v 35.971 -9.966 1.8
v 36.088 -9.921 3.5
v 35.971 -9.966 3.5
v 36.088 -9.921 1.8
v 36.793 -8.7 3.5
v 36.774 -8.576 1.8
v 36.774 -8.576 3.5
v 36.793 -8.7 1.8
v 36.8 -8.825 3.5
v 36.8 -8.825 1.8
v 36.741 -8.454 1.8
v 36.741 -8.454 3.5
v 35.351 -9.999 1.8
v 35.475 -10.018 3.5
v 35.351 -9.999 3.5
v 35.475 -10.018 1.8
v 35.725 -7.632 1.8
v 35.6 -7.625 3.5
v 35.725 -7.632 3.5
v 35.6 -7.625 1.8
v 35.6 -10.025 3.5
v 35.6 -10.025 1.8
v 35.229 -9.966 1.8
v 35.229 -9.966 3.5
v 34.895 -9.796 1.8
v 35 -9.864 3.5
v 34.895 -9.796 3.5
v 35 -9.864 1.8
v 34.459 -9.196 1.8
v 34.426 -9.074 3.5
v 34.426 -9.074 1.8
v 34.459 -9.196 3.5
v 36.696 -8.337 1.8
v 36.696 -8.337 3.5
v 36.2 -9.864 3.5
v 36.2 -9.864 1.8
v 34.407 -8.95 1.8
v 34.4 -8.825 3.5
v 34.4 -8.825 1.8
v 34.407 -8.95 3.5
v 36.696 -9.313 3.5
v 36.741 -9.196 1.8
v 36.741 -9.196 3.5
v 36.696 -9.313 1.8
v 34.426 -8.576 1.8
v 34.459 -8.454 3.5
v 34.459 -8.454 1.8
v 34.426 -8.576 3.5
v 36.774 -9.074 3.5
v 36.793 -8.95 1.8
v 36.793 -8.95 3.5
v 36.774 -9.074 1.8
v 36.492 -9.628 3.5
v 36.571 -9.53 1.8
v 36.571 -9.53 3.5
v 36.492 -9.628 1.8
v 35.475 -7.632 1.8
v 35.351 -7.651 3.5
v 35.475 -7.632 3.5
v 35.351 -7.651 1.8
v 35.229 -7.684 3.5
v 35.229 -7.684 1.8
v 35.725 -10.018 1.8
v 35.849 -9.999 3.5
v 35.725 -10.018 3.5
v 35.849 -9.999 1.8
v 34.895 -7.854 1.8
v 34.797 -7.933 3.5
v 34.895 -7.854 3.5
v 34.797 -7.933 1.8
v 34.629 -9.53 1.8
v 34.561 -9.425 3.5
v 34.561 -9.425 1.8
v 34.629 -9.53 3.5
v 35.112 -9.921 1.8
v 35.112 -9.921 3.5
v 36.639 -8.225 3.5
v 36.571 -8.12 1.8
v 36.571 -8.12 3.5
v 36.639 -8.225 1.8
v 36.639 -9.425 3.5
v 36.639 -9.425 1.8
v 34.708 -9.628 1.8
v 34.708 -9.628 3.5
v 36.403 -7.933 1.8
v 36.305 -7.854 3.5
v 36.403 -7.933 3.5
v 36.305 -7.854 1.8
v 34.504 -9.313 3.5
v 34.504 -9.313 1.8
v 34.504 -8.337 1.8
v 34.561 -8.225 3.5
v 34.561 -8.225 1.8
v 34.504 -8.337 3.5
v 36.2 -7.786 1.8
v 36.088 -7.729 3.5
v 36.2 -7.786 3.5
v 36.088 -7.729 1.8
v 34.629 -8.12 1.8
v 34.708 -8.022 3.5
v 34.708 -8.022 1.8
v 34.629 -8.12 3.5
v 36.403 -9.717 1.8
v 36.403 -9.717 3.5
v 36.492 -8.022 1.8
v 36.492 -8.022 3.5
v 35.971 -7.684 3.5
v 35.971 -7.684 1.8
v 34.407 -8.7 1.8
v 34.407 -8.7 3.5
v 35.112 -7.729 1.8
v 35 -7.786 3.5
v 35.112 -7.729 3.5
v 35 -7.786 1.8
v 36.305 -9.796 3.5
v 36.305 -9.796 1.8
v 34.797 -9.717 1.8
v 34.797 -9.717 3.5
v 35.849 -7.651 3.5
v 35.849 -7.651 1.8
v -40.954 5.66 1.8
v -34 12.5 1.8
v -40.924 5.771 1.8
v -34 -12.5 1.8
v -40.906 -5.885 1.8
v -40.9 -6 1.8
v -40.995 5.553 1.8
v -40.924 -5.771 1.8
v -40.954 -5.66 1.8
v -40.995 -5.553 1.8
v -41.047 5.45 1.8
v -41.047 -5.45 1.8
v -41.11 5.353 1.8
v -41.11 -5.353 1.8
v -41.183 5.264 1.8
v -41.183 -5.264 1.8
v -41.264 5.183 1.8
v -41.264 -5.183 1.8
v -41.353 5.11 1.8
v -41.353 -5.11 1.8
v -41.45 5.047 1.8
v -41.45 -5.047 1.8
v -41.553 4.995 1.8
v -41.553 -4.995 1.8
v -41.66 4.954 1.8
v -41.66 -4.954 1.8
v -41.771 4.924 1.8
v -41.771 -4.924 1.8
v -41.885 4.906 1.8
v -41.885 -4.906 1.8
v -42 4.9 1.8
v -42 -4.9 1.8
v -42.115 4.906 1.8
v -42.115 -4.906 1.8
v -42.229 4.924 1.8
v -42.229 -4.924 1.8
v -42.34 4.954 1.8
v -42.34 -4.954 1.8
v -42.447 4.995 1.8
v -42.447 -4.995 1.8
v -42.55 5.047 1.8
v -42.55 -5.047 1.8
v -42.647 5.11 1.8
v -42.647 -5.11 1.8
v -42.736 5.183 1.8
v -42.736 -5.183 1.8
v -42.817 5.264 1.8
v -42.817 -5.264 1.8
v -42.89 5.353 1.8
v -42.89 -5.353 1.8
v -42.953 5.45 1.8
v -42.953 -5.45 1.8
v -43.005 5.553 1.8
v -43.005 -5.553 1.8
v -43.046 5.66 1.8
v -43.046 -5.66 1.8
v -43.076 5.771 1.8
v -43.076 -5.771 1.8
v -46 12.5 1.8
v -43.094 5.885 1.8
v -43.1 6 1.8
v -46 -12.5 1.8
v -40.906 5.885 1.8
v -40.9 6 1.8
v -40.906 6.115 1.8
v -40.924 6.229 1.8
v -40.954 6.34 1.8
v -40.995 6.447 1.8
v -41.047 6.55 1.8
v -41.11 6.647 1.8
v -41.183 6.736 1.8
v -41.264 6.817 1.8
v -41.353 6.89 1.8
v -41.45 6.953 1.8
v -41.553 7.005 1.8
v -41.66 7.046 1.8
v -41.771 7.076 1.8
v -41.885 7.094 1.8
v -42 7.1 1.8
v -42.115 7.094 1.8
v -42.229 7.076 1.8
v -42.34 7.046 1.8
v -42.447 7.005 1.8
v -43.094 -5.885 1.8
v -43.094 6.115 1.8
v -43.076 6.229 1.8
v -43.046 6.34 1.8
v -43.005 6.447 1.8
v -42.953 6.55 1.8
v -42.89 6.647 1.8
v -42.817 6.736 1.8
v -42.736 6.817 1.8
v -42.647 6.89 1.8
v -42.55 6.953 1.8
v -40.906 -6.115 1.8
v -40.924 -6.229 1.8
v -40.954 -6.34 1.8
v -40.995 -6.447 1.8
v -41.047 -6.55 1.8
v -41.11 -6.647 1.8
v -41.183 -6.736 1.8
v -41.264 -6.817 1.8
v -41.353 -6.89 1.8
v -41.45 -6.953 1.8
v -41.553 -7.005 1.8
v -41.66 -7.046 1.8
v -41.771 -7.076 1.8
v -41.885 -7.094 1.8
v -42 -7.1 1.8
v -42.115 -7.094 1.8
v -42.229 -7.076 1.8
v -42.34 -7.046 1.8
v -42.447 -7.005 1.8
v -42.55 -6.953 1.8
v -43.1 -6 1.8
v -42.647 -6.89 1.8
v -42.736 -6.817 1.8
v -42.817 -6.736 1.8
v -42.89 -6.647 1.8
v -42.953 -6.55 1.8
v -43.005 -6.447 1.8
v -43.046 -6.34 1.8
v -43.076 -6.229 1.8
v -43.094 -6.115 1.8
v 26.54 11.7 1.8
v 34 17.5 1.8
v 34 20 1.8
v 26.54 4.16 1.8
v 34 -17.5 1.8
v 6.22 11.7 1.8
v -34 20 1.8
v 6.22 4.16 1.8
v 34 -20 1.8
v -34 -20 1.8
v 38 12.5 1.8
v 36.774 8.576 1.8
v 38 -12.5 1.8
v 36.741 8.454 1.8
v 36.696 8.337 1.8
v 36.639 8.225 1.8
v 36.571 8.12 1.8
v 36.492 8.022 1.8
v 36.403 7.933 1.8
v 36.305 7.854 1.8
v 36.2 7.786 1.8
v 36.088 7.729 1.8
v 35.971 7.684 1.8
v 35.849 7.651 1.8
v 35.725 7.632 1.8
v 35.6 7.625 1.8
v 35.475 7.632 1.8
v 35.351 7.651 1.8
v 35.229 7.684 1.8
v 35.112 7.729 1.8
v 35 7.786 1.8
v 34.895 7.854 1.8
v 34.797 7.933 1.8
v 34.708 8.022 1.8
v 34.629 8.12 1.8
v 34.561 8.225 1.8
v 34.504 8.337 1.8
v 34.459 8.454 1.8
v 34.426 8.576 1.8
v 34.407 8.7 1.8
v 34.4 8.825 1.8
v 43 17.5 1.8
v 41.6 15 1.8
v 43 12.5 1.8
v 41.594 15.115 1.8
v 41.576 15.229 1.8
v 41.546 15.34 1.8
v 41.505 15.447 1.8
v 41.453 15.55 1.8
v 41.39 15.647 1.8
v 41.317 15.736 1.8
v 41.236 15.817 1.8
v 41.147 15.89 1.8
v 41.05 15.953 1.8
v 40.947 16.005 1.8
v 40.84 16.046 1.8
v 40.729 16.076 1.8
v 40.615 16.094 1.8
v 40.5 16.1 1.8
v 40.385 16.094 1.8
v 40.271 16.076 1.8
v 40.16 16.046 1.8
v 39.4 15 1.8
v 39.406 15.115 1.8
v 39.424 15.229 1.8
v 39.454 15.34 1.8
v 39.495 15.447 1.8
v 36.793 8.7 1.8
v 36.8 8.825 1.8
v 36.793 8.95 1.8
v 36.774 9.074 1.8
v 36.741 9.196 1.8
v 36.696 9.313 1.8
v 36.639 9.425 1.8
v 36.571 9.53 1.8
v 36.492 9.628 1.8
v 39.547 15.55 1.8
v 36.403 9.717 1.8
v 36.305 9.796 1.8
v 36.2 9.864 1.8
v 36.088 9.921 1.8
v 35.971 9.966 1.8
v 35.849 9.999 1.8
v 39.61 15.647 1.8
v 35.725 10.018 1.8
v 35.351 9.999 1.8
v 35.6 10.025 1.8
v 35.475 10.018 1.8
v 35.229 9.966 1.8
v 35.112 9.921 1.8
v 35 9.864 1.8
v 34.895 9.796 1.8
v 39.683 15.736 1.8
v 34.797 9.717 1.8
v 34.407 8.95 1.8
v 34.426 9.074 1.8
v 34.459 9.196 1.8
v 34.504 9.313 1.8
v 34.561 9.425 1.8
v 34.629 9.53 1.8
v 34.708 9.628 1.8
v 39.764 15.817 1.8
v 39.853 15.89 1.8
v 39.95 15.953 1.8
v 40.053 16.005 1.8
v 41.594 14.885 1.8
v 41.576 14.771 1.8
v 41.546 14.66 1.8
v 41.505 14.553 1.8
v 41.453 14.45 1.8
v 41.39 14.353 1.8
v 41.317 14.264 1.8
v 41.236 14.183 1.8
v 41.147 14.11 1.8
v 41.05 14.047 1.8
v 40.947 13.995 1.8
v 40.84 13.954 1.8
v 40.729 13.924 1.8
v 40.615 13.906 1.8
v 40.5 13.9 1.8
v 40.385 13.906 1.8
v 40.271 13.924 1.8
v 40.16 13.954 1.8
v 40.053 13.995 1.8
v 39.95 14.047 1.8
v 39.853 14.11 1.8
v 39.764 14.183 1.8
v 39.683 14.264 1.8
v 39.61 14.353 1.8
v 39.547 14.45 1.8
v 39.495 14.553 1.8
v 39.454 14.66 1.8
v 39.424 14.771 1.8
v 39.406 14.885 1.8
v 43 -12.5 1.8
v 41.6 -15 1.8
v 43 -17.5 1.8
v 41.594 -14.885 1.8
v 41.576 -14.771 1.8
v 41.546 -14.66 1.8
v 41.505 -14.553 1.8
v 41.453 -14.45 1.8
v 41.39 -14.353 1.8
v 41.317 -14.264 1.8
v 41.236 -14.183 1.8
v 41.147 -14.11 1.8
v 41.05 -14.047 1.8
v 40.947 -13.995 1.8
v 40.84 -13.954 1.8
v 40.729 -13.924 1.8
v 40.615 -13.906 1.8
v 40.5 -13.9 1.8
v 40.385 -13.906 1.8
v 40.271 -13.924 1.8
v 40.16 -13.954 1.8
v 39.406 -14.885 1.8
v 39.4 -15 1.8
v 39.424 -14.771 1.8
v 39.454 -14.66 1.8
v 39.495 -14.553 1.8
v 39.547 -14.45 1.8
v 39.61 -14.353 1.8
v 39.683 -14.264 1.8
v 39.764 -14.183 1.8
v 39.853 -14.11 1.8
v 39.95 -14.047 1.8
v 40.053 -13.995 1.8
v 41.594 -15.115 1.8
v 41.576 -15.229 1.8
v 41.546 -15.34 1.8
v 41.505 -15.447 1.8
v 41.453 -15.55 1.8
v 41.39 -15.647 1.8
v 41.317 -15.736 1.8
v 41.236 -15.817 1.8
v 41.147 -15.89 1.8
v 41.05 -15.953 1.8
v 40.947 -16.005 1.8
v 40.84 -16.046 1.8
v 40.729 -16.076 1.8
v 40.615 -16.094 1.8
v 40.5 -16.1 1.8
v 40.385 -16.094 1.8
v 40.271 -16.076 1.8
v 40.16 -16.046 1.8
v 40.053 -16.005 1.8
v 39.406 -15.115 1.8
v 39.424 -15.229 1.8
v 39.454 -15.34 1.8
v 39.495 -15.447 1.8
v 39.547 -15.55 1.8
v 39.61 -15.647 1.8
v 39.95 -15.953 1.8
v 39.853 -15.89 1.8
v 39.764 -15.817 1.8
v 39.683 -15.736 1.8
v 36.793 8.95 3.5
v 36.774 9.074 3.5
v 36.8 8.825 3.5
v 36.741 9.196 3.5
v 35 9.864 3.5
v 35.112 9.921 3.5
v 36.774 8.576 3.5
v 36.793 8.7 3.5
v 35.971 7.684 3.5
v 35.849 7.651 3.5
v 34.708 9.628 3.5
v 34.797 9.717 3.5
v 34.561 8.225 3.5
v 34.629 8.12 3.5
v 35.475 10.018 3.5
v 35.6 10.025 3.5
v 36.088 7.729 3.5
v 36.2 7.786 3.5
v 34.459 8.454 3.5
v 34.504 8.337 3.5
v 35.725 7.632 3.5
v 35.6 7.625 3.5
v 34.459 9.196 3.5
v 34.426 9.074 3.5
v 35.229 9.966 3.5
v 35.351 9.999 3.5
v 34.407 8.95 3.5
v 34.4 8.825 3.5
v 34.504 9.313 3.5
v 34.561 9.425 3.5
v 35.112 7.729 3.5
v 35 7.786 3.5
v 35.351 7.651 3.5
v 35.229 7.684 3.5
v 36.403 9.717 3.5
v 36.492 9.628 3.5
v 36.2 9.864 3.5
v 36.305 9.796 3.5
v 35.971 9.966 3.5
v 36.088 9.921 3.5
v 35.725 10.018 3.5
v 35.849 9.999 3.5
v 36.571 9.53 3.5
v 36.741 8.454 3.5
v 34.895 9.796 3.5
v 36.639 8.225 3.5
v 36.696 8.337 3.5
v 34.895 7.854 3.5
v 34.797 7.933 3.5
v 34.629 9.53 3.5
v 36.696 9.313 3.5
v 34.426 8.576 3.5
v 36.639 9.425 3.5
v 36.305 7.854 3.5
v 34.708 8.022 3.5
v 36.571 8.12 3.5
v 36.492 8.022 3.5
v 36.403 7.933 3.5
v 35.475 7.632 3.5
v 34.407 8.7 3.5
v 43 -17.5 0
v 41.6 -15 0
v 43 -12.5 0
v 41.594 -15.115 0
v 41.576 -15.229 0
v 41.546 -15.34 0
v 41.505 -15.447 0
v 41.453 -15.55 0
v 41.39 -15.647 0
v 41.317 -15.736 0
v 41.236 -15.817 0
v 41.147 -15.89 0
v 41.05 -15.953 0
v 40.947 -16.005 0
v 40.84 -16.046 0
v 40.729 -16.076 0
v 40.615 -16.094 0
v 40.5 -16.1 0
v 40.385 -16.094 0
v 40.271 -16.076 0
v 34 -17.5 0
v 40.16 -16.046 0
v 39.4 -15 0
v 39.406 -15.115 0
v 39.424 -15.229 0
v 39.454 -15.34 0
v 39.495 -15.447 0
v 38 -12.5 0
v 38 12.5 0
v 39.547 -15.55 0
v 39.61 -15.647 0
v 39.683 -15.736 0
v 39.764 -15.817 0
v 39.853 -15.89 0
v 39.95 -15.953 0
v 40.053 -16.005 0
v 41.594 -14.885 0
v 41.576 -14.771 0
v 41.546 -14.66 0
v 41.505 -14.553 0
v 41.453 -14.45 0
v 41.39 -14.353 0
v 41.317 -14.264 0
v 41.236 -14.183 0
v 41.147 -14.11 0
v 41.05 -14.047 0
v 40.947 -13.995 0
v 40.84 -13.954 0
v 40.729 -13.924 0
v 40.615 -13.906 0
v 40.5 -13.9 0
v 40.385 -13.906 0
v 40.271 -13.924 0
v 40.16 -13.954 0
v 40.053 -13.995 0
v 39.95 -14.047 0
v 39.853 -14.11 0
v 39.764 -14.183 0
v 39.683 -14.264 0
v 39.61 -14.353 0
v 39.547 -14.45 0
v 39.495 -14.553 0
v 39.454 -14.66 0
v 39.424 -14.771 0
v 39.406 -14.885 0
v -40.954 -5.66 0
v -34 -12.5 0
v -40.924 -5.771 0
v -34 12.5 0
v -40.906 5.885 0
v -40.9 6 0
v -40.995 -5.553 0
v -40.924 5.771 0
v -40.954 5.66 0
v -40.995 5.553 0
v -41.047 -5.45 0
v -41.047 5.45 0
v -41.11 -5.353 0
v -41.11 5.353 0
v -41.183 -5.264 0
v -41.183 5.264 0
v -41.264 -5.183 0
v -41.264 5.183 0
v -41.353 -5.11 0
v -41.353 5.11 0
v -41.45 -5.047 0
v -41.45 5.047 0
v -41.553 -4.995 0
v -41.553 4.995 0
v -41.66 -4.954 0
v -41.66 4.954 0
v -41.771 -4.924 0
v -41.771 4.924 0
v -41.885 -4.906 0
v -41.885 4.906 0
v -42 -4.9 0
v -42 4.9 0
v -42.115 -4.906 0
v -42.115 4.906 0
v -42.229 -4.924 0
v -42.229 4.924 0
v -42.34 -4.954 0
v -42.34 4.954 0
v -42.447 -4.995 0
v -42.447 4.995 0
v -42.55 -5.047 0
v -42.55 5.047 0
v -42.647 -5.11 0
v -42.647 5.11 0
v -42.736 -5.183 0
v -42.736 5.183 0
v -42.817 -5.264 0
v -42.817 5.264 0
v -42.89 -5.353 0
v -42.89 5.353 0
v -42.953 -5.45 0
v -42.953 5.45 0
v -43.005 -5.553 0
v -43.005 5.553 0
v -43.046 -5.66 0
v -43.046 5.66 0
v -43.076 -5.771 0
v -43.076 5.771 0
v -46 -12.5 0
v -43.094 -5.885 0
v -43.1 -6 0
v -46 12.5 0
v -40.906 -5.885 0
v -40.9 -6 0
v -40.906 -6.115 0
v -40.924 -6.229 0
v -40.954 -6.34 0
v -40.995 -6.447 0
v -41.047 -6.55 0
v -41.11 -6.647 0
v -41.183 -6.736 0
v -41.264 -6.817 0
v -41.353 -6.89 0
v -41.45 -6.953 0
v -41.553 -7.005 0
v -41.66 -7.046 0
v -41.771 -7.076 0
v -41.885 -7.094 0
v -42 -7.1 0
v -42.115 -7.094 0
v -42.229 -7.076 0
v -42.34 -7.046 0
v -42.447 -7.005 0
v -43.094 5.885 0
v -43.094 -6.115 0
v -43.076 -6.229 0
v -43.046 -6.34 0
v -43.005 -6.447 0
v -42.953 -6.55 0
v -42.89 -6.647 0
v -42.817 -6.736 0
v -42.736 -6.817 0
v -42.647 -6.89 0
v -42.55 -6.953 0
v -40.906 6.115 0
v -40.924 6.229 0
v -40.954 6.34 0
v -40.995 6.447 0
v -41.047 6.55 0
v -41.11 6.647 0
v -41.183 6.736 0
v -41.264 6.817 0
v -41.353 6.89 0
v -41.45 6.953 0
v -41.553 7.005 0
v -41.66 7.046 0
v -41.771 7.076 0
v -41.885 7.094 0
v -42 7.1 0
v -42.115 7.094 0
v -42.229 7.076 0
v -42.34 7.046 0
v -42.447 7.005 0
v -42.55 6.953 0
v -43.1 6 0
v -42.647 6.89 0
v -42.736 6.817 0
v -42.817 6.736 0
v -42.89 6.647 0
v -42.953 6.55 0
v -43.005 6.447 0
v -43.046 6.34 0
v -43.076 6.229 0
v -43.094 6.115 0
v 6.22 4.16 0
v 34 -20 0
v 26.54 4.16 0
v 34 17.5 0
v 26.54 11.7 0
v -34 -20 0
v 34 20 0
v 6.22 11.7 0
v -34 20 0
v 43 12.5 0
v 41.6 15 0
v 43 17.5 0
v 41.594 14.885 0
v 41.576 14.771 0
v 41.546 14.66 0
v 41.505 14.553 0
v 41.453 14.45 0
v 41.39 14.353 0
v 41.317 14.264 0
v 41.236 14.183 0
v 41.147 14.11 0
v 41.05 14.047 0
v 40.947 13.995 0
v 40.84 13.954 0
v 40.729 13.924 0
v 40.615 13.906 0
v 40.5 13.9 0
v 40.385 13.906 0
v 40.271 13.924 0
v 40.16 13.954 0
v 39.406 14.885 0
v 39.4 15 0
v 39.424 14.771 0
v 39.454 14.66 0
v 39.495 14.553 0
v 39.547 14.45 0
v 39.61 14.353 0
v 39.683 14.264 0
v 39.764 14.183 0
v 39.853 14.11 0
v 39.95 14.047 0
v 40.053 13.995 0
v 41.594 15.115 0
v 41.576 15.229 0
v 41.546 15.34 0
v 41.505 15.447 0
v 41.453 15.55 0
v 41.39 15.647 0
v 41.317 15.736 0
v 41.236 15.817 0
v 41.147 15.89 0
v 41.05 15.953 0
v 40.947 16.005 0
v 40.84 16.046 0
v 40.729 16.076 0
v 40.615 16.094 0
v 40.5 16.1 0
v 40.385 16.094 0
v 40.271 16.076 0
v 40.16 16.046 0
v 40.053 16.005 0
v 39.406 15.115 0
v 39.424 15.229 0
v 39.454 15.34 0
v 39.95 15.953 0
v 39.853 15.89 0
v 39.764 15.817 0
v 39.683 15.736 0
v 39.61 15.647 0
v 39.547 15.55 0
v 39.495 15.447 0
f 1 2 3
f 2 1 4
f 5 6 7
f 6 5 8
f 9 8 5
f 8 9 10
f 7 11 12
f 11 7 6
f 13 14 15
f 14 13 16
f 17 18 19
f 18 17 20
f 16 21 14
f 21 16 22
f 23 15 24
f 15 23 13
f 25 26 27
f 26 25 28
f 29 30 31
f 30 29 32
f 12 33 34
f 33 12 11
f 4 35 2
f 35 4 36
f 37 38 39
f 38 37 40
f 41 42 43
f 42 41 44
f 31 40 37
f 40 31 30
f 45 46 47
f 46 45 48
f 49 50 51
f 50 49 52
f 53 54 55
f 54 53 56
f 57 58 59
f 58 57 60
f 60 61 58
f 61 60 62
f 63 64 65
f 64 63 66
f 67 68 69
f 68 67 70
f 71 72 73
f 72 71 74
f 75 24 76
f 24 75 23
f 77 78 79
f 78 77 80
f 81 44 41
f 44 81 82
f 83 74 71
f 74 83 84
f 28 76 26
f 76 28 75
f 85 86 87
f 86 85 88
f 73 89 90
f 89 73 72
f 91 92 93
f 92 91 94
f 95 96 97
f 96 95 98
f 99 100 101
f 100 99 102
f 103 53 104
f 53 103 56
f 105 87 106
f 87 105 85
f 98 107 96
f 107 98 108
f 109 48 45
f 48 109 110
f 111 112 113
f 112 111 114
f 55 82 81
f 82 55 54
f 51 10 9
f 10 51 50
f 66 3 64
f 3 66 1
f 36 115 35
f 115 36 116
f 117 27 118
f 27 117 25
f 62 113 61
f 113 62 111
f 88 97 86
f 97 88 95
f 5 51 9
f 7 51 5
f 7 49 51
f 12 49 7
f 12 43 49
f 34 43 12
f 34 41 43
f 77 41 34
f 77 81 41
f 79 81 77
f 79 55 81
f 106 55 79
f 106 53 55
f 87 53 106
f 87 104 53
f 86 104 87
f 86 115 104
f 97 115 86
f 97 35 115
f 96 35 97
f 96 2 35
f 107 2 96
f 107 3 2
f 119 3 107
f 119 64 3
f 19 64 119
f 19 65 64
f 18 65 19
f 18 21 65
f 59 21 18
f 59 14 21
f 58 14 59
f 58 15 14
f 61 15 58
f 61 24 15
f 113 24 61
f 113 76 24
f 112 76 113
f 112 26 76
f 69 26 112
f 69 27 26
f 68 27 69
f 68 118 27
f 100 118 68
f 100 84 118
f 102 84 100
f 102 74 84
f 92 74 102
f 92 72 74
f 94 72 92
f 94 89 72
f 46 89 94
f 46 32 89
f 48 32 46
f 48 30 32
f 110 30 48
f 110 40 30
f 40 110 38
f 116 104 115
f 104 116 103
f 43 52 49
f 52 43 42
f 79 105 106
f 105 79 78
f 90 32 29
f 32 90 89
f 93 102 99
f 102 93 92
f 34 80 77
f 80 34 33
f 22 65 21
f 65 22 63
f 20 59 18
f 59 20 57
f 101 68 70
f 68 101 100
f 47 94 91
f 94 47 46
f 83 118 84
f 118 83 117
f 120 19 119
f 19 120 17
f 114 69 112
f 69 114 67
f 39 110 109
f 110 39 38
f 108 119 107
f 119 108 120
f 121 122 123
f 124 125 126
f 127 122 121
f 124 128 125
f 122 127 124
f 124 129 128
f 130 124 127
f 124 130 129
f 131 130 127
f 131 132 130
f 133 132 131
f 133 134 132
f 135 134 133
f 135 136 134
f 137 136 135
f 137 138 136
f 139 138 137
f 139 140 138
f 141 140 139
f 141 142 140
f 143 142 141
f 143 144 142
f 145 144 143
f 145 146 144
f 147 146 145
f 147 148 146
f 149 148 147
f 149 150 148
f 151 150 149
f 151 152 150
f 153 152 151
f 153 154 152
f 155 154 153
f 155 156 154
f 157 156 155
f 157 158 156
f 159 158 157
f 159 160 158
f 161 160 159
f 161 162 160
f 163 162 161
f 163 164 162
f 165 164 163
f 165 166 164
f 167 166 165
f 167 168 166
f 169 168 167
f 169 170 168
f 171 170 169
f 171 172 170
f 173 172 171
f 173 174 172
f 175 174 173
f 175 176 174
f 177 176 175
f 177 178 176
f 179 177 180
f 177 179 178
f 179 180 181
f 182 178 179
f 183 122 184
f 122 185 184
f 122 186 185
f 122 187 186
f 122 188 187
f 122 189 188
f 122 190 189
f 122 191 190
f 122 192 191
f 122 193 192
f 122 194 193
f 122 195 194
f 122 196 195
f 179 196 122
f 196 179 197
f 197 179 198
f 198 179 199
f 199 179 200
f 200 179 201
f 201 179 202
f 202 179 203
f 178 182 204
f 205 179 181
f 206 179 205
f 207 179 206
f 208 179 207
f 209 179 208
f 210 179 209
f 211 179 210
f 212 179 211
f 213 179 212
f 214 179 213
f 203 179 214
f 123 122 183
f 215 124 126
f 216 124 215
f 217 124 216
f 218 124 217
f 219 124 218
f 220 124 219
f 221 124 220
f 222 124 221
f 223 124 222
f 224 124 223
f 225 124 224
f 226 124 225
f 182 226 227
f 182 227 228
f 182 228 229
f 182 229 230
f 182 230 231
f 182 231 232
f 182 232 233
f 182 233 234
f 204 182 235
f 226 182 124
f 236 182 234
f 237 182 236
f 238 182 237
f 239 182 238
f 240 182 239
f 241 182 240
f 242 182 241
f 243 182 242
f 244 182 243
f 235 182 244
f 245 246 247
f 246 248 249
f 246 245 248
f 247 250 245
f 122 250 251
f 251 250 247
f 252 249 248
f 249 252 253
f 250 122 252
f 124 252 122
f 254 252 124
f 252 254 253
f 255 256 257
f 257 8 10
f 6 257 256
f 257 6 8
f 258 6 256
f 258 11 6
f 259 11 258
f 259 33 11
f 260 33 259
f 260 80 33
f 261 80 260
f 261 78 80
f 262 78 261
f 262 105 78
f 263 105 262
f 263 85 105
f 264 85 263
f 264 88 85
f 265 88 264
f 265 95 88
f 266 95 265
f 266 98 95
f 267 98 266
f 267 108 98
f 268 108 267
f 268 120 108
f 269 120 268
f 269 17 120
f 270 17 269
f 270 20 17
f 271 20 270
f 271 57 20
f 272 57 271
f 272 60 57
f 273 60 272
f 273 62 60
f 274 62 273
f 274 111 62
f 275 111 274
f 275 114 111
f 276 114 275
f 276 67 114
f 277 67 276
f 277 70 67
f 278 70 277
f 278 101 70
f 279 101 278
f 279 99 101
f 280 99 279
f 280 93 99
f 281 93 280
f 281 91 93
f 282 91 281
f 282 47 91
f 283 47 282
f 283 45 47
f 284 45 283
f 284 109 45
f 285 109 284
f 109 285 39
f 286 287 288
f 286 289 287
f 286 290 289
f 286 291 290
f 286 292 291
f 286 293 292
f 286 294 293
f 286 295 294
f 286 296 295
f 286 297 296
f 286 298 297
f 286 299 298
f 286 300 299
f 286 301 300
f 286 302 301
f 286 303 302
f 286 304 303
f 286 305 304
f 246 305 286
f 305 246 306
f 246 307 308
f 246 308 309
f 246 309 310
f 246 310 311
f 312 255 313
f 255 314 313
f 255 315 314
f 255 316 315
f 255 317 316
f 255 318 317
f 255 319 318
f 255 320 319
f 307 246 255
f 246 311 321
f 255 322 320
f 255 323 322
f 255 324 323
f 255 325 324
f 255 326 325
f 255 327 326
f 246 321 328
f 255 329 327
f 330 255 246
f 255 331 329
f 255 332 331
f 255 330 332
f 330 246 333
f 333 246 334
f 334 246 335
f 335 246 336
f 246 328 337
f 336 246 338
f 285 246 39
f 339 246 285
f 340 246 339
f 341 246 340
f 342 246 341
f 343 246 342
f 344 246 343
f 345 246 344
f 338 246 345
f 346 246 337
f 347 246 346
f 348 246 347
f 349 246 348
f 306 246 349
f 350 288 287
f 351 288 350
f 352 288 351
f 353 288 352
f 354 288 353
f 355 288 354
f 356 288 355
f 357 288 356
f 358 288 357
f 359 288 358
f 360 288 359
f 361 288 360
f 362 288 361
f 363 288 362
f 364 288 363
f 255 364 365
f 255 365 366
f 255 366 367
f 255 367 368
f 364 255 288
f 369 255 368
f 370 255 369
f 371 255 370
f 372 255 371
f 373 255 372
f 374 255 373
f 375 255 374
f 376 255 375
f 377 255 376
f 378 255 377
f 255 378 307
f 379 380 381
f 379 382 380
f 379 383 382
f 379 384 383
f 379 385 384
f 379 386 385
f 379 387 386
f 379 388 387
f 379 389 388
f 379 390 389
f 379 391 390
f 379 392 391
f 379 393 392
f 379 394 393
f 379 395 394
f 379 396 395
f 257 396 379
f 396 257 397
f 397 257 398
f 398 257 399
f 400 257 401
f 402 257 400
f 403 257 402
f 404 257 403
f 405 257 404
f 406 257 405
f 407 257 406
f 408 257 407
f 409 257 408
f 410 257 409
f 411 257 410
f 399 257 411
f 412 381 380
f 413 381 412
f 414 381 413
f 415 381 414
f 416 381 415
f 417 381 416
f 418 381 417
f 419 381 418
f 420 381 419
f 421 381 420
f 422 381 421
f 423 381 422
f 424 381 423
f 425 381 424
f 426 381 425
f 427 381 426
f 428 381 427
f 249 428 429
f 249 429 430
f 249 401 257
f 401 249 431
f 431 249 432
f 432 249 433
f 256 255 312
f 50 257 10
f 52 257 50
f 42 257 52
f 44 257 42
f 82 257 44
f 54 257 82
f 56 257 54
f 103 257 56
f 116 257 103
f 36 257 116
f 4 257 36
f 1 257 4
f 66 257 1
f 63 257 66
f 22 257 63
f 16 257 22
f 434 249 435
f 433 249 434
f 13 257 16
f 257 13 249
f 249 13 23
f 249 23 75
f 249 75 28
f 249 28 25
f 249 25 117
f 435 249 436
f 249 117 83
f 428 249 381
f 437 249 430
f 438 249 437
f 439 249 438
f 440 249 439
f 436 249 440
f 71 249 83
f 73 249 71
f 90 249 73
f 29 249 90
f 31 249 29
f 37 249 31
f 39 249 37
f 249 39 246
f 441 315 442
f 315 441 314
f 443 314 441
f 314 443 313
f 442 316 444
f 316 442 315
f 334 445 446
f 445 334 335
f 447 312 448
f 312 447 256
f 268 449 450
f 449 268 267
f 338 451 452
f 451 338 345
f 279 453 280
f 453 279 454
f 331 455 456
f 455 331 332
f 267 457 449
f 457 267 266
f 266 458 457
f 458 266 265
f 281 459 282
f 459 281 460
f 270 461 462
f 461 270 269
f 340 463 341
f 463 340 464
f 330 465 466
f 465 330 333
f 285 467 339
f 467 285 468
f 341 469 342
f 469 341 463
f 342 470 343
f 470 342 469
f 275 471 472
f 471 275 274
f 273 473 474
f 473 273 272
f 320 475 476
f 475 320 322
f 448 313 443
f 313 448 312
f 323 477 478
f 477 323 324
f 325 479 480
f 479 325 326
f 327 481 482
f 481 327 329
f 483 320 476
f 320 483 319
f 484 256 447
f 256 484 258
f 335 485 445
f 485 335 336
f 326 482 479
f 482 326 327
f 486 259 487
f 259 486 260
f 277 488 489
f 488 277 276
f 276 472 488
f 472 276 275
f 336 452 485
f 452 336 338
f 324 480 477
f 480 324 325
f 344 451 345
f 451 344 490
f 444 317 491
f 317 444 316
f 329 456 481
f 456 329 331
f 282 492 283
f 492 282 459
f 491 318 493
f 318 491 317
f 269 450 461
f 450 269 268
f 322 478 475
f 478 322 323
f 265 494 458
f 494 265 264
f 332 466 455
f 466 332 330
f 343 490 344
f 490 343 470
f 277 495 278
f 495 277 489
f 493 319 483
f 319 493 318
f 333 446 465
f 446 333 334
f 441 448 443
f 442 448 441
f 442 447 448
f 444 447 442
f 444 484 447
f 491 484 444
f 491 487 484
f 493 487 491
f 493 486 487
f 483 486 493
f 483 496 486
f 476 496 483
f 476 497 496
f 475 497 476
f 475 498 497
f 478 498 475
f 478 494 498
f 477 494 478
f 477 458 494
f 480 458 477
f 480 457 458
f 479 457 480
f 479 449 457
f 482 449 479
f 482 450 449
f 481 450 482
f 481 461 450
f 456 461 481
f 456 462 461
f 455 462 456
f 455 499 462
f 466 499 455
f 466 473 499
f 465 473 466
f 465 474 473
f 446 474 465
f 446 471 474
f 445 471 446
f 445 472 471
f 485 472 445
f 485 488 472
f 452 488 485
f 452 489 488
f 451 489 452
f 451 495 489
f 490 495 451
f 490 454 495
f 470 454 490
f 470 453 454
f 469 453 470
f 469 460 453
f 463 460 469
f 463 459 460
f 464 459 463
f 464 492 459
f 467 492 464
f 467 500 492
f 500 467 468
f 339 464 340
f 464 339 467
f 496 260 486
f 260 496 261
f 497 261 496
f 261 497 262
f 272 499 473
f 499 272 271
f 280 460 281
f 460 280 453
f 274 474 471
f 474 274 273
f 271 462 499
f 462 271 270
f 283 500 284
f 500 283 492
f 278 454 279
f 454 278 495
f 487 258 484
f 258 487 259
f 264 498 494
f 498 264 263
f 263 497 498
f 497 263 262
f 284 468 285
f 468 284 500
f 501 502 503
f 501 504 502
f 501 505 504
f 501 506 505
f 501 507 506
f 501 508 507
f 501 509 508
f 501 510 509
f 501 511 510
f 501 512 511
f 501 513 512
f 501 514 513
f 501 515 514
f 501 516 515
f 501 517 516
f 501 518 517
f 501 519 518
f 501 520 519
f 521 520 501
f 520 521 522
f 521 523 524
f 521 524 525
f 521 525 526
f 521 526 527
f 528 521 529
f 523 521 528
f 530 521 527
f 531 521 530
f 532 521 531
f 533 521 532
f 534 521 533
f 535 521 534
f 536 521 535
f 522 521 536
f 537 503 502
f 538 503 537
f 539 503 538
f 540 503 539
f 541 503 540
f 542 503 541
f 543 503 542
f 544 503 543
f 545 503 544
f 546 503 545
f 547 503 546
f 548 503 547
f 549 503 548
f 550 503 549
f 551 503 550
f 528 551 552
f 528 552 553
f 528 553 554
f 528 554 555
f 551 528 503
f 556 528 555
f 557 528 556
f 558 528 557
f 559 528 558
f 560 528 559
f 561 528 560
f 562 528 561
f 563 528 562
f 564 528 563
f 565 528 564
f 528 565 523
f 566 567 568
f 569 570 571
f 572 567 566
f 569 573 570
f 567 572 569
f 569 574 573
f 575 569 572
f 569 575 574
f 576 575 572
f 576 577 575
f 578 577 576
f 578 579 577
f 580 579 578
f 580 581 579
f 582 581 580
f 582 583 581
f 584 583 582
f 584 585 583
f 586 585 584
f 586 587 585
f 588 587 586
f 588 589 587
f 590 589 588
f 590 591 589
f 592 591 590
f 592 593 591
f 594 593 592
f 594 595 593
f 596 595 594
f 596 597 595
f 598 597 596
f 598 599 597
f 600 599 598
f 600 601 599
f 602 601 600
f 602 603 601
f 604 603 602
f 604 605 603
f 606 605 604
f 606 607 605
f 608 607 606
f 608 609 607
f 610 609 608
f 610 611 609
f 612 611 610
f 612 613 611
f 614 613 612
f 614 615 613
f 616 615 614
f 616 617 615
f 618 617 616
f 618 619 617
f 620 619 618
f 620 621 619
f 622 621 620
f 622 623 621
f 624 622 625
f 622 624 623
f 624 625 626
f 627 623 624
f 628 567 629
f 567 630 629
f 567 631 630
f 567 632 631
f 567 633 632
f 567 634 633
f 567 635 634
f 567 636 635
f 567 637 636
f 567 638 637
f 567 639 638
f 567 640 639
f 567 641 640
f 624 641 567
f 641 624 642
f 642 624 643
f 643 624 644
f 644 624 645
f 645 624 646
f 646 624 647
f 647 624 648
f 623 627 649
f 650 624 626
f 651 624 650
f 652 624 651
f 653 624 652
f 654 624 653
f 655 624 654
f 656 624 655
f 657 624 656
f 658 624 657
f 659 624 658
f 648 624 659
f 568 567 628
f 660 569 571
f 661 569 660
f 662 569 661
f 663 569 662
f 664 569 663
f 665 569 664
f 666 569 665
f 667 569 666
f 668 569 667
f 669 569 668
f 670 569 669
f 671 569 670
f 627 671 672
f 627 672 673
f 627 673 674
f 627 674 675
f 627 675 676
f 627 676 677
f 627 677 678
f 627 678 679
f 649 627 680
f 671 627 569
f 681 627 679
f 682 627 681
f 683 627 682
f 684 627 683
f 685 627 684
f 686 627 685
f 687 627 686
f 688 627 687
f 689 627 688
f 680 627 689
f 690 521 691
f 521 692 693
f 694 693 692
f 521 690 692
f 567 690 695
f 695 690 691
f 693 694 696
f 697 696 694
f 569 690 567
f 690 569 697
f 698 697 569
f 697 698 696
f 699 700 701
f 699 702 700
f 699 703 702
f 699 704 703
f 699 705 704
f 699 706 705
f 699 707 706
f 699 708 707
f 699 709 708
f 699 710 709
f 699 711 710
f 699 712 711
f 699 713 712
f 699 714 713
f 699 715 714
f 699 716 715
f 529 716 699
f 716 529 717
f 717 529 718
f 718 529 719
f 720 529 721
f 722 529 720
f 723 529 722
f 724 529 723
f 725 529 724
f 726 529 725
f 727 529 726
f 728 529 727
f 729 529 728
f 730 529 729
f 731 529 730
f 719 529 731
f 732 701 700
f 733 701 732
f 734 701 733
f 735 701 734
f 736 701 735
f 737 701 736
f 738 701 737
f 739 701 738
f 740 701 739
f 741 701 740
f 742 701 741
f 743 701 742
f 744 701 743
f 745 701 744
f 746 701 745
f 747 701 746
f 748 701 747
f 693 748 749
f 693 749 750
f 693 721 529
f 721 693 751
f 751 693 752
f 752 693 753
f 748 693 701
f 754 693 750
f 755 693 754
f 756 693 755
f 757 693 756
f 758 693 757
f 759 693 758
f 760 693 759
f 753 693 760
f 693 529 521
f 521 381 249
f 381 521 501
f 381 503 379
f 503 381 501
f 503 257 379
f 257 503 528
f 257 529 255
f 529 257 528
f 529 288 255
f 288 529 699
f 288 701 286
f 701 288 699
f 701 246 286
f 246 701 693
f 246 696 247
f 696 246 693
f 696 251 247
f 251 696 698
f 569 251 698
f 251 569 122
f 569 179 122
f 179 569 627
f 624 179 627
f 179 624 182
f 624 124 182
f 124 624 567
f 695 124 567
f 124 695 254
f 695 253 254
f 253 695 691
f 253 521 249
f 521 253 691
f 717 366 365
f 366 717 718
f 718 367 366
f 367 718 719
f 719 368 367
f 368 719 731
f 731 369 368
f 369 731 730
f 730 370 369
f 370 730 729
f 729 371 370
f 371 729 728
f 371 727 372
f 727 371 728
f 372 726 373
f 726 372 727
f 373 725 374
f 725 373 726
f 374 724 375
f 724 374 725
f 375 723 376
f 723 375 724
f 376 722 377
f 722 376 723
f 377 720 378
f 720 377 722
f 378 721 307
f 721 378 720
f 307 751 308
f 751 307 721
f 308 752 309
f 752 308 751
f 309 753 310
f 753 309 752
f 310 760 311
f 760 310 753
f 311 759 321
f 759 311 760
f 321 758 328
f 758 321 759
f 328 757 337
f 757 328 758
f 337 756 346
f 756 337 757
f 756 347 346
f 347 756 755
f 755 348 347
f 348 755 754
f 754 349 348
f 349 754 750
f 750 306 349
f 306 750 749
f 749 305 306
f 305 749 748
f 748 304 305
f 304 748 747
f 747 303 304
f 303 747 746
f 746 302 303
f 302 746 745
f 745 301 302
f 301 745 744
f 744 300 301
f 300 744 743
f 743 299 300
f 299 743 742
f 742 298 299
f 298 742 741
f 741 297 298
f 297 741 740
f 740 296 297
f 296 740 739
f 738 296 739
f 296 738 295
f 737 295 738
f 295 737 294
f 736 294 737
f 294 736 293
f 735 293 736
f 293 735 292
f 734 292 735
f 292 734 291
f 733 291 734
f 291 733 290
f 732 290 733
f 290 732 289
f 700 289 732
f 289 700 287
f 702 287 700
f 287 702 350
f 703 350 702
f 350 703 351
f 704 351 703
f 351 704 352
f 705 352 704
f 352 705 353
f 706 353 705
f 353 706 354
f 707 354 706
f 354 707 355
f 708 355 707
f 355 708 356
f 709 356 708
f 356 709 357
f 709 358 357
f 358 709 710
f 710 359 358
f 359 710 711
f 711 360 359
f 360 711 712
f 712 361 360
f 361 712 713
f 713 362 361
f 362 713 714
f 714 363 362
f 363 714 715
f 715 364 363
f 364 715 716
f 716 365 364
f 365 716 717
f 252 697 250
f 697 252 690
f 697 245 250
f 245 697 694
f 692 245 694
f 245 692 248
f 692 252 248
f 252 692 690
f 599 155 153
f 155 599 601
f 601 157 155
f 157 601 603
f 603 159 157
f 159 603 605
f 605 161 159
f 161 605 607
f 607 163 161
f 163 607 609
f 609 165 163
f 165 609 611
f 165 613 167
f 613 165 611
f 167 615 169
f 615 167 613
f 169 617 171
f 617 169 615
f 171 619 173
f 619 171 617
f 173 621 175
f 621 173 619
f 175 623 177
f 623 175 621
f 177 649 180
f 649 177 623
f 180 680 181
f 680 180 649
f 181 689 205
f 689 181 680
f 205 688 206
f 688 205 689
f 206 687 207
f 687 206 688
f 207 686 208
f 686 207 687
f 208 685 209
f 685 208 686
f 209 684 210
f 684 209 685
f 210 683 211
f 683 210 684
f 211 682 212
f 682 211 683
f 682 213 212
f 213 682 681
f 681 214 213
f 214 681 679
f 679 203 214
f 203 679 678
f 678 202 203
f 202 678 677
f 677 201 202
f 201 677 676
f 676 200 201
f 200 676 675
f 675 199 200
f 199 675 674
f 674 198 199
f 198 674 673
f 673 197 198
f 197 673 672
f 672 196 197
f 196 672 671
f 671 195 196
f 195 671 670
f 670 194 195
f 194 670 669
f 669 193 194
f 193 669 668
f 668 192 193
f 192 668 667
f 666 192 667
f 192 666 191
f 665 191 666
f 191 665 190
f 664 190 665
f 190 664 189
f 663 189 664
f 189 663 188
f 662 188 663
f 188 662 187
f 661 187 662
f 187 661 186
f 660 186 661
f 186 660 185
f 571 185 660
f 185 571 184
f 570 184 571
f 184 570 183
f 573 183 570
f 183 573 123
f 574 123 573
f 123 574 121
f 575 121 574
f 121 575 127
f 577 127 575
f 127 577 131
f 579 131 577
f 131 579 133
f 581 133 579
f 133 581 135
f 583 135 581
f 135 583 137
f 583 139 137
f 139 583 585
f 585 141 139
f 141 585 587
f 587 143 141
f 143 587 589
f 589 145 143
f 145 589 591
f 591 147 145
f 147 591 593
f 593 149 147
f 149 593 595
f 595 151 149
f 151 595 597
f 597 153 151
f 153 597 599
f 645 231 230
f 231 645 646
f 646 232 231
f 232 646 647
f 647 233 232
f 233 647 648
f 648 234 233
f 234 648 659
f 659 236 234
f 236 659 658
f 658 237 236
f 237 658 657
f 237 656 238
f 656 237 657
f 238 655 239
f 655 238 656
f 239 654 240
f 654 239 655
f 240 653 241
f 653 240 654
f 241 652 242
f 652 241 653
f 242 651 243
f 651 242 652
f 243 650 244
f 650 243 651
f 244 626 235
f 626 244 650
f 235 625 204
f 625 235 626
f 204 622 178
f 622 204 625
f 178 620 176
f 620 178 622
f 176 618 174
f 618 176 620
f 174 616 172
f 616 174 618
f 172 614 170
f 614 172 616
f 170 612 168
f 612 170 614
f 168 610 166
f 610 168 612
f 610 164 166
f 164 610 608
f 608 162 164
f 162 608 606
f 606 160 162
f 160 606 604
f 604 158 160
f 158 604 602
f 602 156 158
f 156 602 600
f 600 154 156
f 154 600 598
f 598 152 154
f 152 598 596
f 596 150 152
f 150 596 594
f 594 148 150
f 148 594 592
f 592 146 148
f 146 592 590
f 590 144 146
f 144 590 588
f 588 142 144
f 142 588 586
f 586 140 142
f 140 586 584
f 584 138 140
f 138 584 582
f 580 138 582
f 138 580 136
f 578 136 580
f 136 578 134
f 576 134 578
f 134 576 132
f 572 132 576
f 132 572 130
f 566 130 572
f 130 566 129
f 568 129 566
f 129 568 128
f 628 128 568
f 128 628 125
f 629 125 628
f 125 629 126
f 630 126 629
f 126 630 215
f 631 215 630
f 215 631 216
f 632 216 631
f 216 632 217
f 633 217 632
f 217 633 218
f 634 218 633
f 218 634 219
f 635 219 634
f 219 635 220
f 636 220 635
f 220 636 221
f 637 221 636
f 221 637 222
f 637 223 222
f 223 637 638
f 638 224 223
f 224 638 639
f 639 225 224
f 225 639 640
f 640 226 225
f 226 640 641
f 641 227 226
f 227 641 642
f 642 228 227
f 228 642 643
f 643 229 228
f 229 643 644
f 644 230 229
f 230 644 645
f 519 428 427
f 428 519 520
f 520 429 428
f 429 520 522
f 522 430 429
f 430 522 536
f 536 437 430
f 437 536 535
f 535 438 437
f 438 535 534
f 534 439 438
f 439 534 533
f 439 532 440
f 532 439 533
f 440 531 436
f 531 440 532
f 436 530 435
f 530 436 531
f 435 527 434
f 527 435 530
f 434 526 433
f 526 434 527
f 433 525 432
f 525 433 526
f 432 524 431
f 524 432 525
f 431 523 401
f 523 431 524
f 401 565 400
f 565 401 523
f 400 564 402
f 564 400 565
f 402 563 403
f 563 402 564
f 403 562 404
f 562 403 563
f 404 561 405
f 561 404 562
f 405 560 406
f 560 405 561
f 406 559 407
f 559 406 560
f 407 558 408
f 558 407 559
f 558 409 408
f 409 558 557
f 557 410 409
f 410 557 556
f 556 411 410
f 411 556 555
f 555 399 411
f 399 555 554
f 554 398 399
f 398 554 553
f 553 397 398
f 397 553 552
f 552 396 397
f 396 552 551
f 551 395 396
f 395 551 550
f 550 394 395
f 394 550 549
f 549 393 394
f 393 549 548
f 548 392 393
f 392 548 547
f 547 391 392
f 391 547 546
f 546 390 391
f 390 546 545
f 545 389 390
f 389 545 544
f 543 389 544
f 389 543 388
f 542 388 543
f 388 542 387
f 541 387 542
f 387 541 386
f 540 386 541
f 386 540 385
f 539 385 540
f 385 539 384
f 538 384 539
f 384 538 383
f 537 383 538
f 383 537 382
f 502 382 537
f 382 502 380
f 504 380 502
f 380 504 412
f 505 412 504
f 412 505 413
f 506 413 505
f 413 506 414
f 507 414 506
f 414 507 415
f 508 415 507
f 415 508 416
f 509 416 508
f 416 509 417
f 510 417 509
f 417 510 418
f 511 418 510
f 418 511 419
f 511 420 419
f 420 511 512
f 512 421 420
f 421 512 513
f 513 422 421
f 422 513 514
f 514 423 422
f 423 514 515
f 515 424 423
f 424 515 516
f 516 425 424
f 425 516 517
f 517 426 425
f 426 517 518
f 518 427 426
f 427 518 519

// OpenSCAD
// file: ../include/tube.scad
// Simple tube
// r is the outer radius
// w is the width of the tube wall
module tube(h, r, w) {
  difference() {
    cylinder(h = h, r = r);
    translate([0, 0, - 1])
      cylinder(h = h + 2, r = r - w);
  }
}
// file: ../vitamin/pcb.scad
// Modules and constants for mocking up printed circuit boards

// Conventions:
// -- the long side is x, narrow side is y
// -- the bottom of the board is at z=0

// Header base
hdr_base_x = 2.5;
hdr_base_y = 2.5;
hdr_base_z = 2.5;

// Header pin
hdr_pin_x = 0.7;
hdr_pin_y = 0.7;
hdr_pin_z = 11.75;

// Common components, spec: [x size, y size, z size, color]
micro_usb = [5.0, 7.5, 2.5, "silver"];
jst2 = [6.0, 8.0, 5.6, "black"];
hdmi = [7.25, 11.25, 3.3, "Silver"];
sd_card_holder = [12.0, 11.5, 1.3, "Silver"];

// Printed circuit board with rounded corners
module pcb(x, y, board_h = 1.5, r = 2.5) {
  x_pos = x / 2 - r;
  y_pos = y / 2 - r;

  hull() for (i = [- x_pos, x_pos], j = [- y_pos, y_pos]) {
    translate([i, j, 0]) cylinder(r = r, h = board_h);
  }
}

// Hole in the pcb
module pcb_hole(x, y, r, board_h = 1.5) {
  translate([x, y, - 0.1]) cylinder(h = board_h + 0.2, r = r);
}

// Component that sits on top of the pcb
// Future: support bottom mounted components
module pcb_component(spec, x, y, yaw = 0.0, board_h = 1.5) {
  color(spec[3])
    translate([x, y, board_h + spec[2] / 2])
      rotate([0, 0, yaw])
        cube([spec.x, spec.y, spec.z], center = true);
}

// Header (base + pin)
module pcb_header(x, y, base_z, pin_z) {
  color("Black")
    translate([x, y, base_z])
      cube([hdr_base_x, hdr_base_y, hdr_base_z], center = true);
  color("Silver")
    translate([x, y, pin_z])
      cube([hdr_pin_x, hdr_pin_y, hdr_pin_z], center = true);
}
// file: ../vitamin/pi_zero.scad
include <pcb.scad>

// Options
show_pi = true;
show_gpio_header = 0;  // 0 = no headers, 1 = above, -1 = below
show_extra_header = false;  // 2x2 header for reset switch and RCA composite video

// PCB
pi_x = 65;
pi_y = 30;
pi_z = 1.6;
pi_half_z = pi_z / 2;
pi_corner_r = 3.0;

// Mount holes
pi_hole_edge = 3.5;  // Distance from edge to center of mount hole
pi_hole_d = 2.75;
pi_hole_r = pi_hole_d / 2;
pi_hole_x = pi_x / 2 - pi_hole_edge;
pi_hole_y = pi_y / 2 - pi_hole_edge;
pi_holes = [for (i = [- pi_hole_x, pi_hole_x], j = [- pi_hole_y, pi_hole_y]) [i, j]];

// Header holes
pi_header_pitch = 2.54; // 0.1in
pi_header_size = [20 * pi_header_pitch, 2 * pi_header_pitch];
pi_header_pos = [0, pi_y / 2 - pi_hole_edge]; // center=true

// Components, see pcb.scad::pcb_component()
csi_socket = [3, 17, 1.3, "Ivory"];
csi_clip = [1, 17, 1.3, "DimGray"];
activity_led = [2.3, 1, 1, "GreenYellow"];
cpu = [12, 12, 1.2, "Black"];

// Antenna
antenna_poly = [[- 6.5, - 11.4], [1.5, - 11.4], [- 1.5, - 13.5], [- 4, - 13.5], [- 6.5, - 11.4]];

// Header pin position calculators, return the center of the hole, pitch is 0.1"
function pin_pos_x(i) = - (19 * pi_header_pitch / 2) + i * pi_header_pitch;
function pin_pos_y(j) = pi_hole_y - pi_header_pitch / 2 + j * pi_header_pitch;

// Pi body and headers
module pi_zero() {
  if (show_pi) pi_zero_body();
  if (show_gpio_header) pi_headers(show_gpio_header);
}

// Just Pi body
module pi_zero_body() {
  color("#038f3f") difference() {
    pcb(pi_x, pi_y, pi_z, pi_corner_r);

    // Corner screw holes
    for (pi_hole = pi_holes) {
      pcb_hole(pi_hole.x, pi_hole.y, pi_hole_r, pi_z);
    }

    // GPIO header holes
    for (i = [0:19], j = [0, 1]) {
      pcb_hole(pin_pos_x(i), pin_pos_y(j), 0.5, pi_z);
    }

    // Extra header holes
    for (i = [18, 19], j = [- 1, - 2]) {
      pcb_hole(pin_pos_x(i), pin_pos_y(j), 0.5, pi_z);
    }
  }

  // Components
  pcb_component(cpu, - 7.1, - 2);
  pcb_component(sd_card_holder, - 24.5, 1.9, yaw = 90);
  pcb_component(hdmi, - 20.1, - 11.4, yaw = 90);  // TODO check height!
  pcb_component(micro_usb, 8.9, - 13, yaw = 90);  // Data
  pcb_component(micro_usb, 21.5, - 13, yaw = 90);  // Power
  pcb_component(activity_led, 26.5, - 8);
  pcb_component(csi_socket, 30, 0);
  pcb_component(csi_clip, 32, 0);

  // Antenna
  color("DarkGreen") translate([0, 0, 0.1]) linear_extrude(height = pi_z) polygon(antenna_poly);
}

// Pi headers
module pi_headers(direction = 1) {
  base_z = pi_half_z + direction * (pi_half_z + hdr_base_z / 2);
  pin_z = pi_half_z + direction * (pi_half_z + hdr_pin_z / 2 - 3);

  for (i = [0:19], j = [0, 1]) {
    pcb_header(pin_pos_x(i), pin_pos_y(j), base_z, pin_z);
  }

  if (show_extra_header) {
    for (i = [18, 19], j = [- 1, - 2]) {
      pcb_header(pin_pos_x(i), pin_pos_y(j), base_z, pin_z);
    }
  }
}

// Preview:
//$fn = 60;
//pi_zero();
// file: ../vitamin/blue_robotics.scad
include <../include/tube.scad>

// 2" flange dimensions
flange_h = 21.5;
flange_w = 6;

// TODO camera flange hole orientation is arbitrary, 0, 90, 180, 270 would be more useful

// Flange exterior portion
flange_ext_h = 6;
flange_ext_r = 25;
flange_ext_hole_offset = 23;  // Approximate
flange_ext_holes = [for (angle = [30, 90, 150, 210, 270, 330])
  [cos(angle) * flange_ext_hole_offset, sin(angle) * flange_ext_hole_offset]];

// Flange interior portion
flange_int_h = flange_h - flange_ext_h;
flange_int_r = flange_ext_r - flange_w;
flange_int_hole_offset = 21.5;
flange_int_holes = [for (angle = [30, 120, 210, 300])
  [cos(angle) * flange_int_hole_offset, sin(angle) * flange_int_hole_offset]];

// The pen and cam brackets are flipped upside down, so provide a set of holes that match
flange_int_holes_flipped = [for (angle = [60, 150, 240, 330])
  [cos(angle) * flange_int_hole_offset, sin(angle) * flange_int_hole_offset]];

// 2" tube dimensions
tube_h = 120;
tube_wall = 3.2;
tube_r_inside = 25.4;
tube_r_outside = tube_r_inside + tube_wall;

// Flange exterior 2d pattern
module flange_ext_2d() {
  difference() {
    circle(r = 28.5);
    circle(r = 28.5 - 9.5);

    // Six exterior holes
    for (ext_hole = flange_ext_holes) {
      translate([ext_hole.x, ext_hole.y]) circle(r = 1);
    }
  }
}

// Flange interior 2d pattern
module flange_int_2d() {
  difference() {
    circle(r = flange_ext_r);
    circle(r = flange_ext_r - flange_w);

    // Four interior holes
    for (int_hole = flange_int_holes) {
      translate([int_hole.x, int_hole.y]) circle(r = 1);
    }
  }
}

// BlueRobotics 2" flange
// Aligned so that the 2 penetrations run along the x axis
module flange() {
  // Exterior tube
  linear_extrude(height = flange_ext_h)
    flange_ext_2d();

  // Interior tube
  translate([0, 0, flange_ext_h]) linear_extrude(height = flange_int_h)
    flange_int_2d();
}

// BlueRobotics 2" tube
module two_inch_tube() {
  tube(h = tube_h, r = tube_r_outside, w = tube_wall);
}

// Switch and wires -- just the bits that stick into the tube
module switch_and_wires() {
  cylinder(h = 10, r = 4);
}

// Camera flange
module cam_flange() {
  flange();
}

// Penetration flange with the switch and wires
module pen_flange() {
  flange();

  // One of the two penetrations has a switch and wires sticking into the interior
  //translate([-cos(0) * 9, sin(0) * 9, flange_h]) switch_and_wires();
  translate([- cos(180) * 9, sin(180) * 9, flange_h]) switch_and_wires();
}

// Preview:
//$fn = 60;
//two_inch_tube();
//cam_flange();
//pen_flange();
// file: ../vitamin/adafruit.scad
include <pcb.scad>

pb_size = [36.2, 22.86];
pb_z = 1.6;
pb_hole_r = 1.25; // Measured
pb_hole_x = 36.2 / 2 - 2.5;
pb_hole_y = 17.65 / 2;
pb_holes = [for (j = [- pb_hole_y, pb_hole_y]) [pb_hole_x, j]];
pb_header_pitch = 2.54; // 0.1in
pb_header_size = [pb_header_pitch, 8 * pb_header_pitch];
pb_header_pos = [pb_size.x / 2 - 21.72, pb_size.y / 2 - 1]; // center=true

battery_d = 18.5; // Measured
battery_r = battery_d / 2;
battery_h = 69;

// Adafruit Powerboost 1000 Charger
// https://www.adafruit.com/product/2465
module power_boost() {
  color("#065daa") difference() {
    pcb(pb_size.x, pb_size.y);

    for (hole = pb_holes) {
      pcb_hole(hole.x, hole.y, pb_hole_r, pb_z);
    }

    pb_header_hole_r = 0.5;
    pb_header_hole_x_start = pb_header_pos.x - 3.5 * pb_header_pitch;
    pb_header_hole_y_end = pb_header_pos.x + 3.5 * pb_header_pitch;
    pb_header_holes = [for (j = [pb_header_hole_x_start:pb_header_pitch:pb_header_hole_y_end]) [j, pb_header_pos.y]];
    for (hole = pb_header_holes) {
      pcb_hole(hole.x, hole.y, pb_header_hole_r, pb_z);
    }
  }

  pcb_component(micro_usb, 36.2 / 2 - 2, 0);
  pcb_component(jst2, 7.5, - 8, 90);
  pcb_component([5, 5, 3.9, "black"], - 3, - 4);
}

// Adafruit Lithium Ion Cylindrical Battery - 3.7v 2200mAh
// https://www.adafruit.com/product/1781
module battery() {
  color("#02a5fe") cylinder(h = battery_h, r = battery_r);
}

// Preview:
//$fn = 60;
//power_boost();
//battery();
// file: ../part/ec_common.scad
include <../vitamin/adafruit.scad>
include <../vitamin/blue_robotics.scad>
include <../vitamin/pi_zero.scad>

// All tolerances measured for my Prusa MK3S + PLA + 0.15mm layers

// Good M2 hole radius
M2_hole_r = 1.1;

// When printed sideways it needs to be a bit smaller
M2_hole_side_print_r = 1;

// Build a structure with 2 circular ("ring") brackets connected by 2 flat trays
// The trays have tabs that slot into the cam_bracket and the pen_bracket

// Overall structure size:
structure_h = 76;
bracket_ring_h = 4;
tray_length = structure_h - 2 * bracket_ring_h;

// Bracket radius, slightly smaller than the inside of the tube
bracket_r = tube_r_inside - 0.2;

// Interior radius, slightly smaller than the inside of the flange
interior_r = flange_int_r - 0.2;

// Tray sizes
pi_tray_size = [tray_length, 34, 1.8];
pb_tray_size = [tray_length, 40, 1.8];

// How the trays are positioned in the brackets
pi_slot_position = 18;
pb_slot_position = 8;

// Adjust boards to be center=true
pi_center_offset = pi_slot_position - pi_tray_size.z / 2;
pb_center_offset = pb_slot_position - pb_tray_size.z / 2;

// Slots are slightly larger than tabs
tab_slot_tolerance = 0.15;

// The pi and pb boards also fit snugly into the brackets
board_slot_tolerance = 0.2;

// The pb_tray is attached to the pen_bracket and the cam_bracket at 2 points with M2 screws
attach = [4, 5, 5];
attach_hole_r = M2_hole_r;
attach_hole_side_print_r = M2_hole_side_print_r;
attach_cam_pos_y = 6;
attach_pen_pos_y = 15;

// Holes in pb_tray
attach_cam_holes = [[- 42, - attach_cam_pos_y], [- 42, attach_cam_pos_y]];
attach_pen_holes = [[40.5, - attach_pen_pos_y], [40.5, attach_pen_pos_y]];

// Nut positions in cam_bracket
nut_pb_cam_posns = [[2, - attach_cam_pos_y], [2, attach_cam_pos_y]];

// Tab widths
pi_cam_tab_width = 14;
pi_pen_tab_width = 28;
pb_cam_tab_width = 25;
pb_pen_tab_width = 35;

// Tab sizes
pi_cam_tab = [bracket_ring_h, pi_cam_tab_width];
pi_pen_tab = [bracket_ring_h, pi_pen_tab_width];
pb_cam_tab = [bracket_ring_h + 8, pb_cam_tab_width];
pb_pen_tab = [bracket_ring_h, pb_pen_tab_width];

// Slot sizes
pi_cam_slot = [pi_tray_size.z + tab_slot_tolerance, pi_cam_tab_width + tab_slot_tolerance];
pi_pen_slot = [pi_tray_size.z + tab_slot_tolerance, pi_pen_tab_width + tab_slot_tolerance];
pb_cam_slot = [pb_tray_size.z + tab_slot_tolerance, pb_cam_tab_width + tab_slot_tolerance];
pb_pen_slot = [pb_tray_size.z + tab_slot_tolerance, pb_pen_tab_width + tab_slot_tolerance];

// Slot positions
pi_cam_slot_pos = [pi_center_offset, 0];
pi_pen_slot_pos = [pi_center_offset, 0];
pb_cam_slot_pos = [pb_center_offset, 0];
pb_pen_slot_pos = [pb_center_offset, 0];

// PCB knockout sizes
pi_pcb_kn = [pi_z + board_slot_tolerance, 31];
pb_pcb_kn = [pb_z + board_slot_tolerance, 25.2];  // Same width as tray tab

// PCB knockout positions
pi_pcb_cam_kn_pos = [pi_cam_slot_pos.x - pi_cam_slot.x / 2 - pi_pcb_kn.x / 2, 0];
pi_pcb_pen_kn_pos = [pi_pen_slot_pos.x - pi_pen_slot.x / 2 - pi_pcb_kn.x / 2, 0];
pb_pcb_pen_kn_pos = [pb_pen_slot_pos.x - pb_pen_slot.x / 2 - pb_pcb_kn.x / 2, 0];

// Board component knockout sizes
pi_comp_kn = [3, 18];
pb_comp_kn = [3, 10];

// Board component knockout positions
pi_comp_cam_kn_pos = [pi_pcb_cam_kn_pos.x - pi_pcb_kn.x / 2 - pi_comp_kn.x / 2, 0];
pi_comp_pen_kn_pos = [pi_pcb_pen_kn_pos.x - pi_pcb_kn.x / 2 - pi_comp_kn.x / 2, 0];
pb_comp_pen_kn_pos = [pb_pcb_pen_kn_pos.x - pb_pcb_kn.x / 2 - pb_comp_kn.x / 2, 0];

// Mount the boards on the trays
pi_mount = [5.5, 0];
pb_mount = [20, 0];

// Boards sit slightly off the tray
mount_standoff = 0.3;

// The trays have nibs to hold the boards in place
pi_nib_h = pi_z + board_slot_tolerance / 2;
pb_nib_h = pb_z + board_slot_tolerance / 2;

// All assemblies are built with the camera facing down, where z=0 at the camera center point.
// The 2 trays share a common z, so that appears here.
tray_center_z = tray_length / 2 + flange_h + bracket_ring_h;

// Battery position
battery_pos = [- 9.5, 0, 9];
// file: ../part/pb_tray.scad
include <ec_common.scad>

include <../vitamin/adafruit.scad>

// Power tray 2d pattern
module pb_tray_2d() {
  difference() {
    union() {
      square([pb_tray_size.x, pb_tray_size.y], center = true);

      // pen_bracket tab
      translate([(pb_tray_size.x + pb_pen_tab.x) / 2, 0])
        square(pb_pen_tab, center = true);

      // Hack: extend the pb_tray into the attachment points on top of the pen_bracket
      // I can't extend the entire tab because it gets in the way of the USB cable
      for (y_pos = [(pb_pen_tab_width - attach.y) / 2, (- pb_pen_tab_width + attach.y) / 2]) {
        translate([pb_tray_size.x / 2 +  + pb_pen_tab.x + attach.z / 2, y_pos])
          square([attach.y, attach.z], center = true);
      }

      // cam_bracket tab is longer to reach the attachment points
      translate([- (pb_tray_size.x + pb_cam_tab.x) / 2, 0])
        square(pb_cam_tab, center = true);
    }

    // pen_bracket attachment holes
    for (hole = attach_pen_holes) {
      translate(hole)
        circle(r = attach_hole_r);
    }

    // cam_bracket attachment holes
    for (hole = attach_cam_holes) {
      translate(hole)
        circle(r = attach_hole_r);
    }

    // pb header knockout, rotate 90d
    // Make the hole bigger to expose the pin descriptions on the back of the board
    extra = 5;
    translate([pb_header_pos.x + pb_mount.x, pb_header_pos.y - pb_mount.y - extra / 2])
      square([pb_header_size.y, pb_header_size.x + extra], center = true);
  }
}

// Power tray
module pb_tray() {
  linear_extrude(height = pb_tray_size.z)
    pb_tray_2d();

  // Nibs to hold the power boost
  for (pb_hole = pb_holes) {
    translate([pb_hole.x + pb_mount.x, pb_hole.y + pb_mount.y, pb_tray_size.z])
      cylinder(h = pb_nib_h, r = pb_hole_r - 0.05);
  }
}
// main file
include <../part/pb_tray.scad>

// Hi-def render
$fn = 60;

pb_tray();
